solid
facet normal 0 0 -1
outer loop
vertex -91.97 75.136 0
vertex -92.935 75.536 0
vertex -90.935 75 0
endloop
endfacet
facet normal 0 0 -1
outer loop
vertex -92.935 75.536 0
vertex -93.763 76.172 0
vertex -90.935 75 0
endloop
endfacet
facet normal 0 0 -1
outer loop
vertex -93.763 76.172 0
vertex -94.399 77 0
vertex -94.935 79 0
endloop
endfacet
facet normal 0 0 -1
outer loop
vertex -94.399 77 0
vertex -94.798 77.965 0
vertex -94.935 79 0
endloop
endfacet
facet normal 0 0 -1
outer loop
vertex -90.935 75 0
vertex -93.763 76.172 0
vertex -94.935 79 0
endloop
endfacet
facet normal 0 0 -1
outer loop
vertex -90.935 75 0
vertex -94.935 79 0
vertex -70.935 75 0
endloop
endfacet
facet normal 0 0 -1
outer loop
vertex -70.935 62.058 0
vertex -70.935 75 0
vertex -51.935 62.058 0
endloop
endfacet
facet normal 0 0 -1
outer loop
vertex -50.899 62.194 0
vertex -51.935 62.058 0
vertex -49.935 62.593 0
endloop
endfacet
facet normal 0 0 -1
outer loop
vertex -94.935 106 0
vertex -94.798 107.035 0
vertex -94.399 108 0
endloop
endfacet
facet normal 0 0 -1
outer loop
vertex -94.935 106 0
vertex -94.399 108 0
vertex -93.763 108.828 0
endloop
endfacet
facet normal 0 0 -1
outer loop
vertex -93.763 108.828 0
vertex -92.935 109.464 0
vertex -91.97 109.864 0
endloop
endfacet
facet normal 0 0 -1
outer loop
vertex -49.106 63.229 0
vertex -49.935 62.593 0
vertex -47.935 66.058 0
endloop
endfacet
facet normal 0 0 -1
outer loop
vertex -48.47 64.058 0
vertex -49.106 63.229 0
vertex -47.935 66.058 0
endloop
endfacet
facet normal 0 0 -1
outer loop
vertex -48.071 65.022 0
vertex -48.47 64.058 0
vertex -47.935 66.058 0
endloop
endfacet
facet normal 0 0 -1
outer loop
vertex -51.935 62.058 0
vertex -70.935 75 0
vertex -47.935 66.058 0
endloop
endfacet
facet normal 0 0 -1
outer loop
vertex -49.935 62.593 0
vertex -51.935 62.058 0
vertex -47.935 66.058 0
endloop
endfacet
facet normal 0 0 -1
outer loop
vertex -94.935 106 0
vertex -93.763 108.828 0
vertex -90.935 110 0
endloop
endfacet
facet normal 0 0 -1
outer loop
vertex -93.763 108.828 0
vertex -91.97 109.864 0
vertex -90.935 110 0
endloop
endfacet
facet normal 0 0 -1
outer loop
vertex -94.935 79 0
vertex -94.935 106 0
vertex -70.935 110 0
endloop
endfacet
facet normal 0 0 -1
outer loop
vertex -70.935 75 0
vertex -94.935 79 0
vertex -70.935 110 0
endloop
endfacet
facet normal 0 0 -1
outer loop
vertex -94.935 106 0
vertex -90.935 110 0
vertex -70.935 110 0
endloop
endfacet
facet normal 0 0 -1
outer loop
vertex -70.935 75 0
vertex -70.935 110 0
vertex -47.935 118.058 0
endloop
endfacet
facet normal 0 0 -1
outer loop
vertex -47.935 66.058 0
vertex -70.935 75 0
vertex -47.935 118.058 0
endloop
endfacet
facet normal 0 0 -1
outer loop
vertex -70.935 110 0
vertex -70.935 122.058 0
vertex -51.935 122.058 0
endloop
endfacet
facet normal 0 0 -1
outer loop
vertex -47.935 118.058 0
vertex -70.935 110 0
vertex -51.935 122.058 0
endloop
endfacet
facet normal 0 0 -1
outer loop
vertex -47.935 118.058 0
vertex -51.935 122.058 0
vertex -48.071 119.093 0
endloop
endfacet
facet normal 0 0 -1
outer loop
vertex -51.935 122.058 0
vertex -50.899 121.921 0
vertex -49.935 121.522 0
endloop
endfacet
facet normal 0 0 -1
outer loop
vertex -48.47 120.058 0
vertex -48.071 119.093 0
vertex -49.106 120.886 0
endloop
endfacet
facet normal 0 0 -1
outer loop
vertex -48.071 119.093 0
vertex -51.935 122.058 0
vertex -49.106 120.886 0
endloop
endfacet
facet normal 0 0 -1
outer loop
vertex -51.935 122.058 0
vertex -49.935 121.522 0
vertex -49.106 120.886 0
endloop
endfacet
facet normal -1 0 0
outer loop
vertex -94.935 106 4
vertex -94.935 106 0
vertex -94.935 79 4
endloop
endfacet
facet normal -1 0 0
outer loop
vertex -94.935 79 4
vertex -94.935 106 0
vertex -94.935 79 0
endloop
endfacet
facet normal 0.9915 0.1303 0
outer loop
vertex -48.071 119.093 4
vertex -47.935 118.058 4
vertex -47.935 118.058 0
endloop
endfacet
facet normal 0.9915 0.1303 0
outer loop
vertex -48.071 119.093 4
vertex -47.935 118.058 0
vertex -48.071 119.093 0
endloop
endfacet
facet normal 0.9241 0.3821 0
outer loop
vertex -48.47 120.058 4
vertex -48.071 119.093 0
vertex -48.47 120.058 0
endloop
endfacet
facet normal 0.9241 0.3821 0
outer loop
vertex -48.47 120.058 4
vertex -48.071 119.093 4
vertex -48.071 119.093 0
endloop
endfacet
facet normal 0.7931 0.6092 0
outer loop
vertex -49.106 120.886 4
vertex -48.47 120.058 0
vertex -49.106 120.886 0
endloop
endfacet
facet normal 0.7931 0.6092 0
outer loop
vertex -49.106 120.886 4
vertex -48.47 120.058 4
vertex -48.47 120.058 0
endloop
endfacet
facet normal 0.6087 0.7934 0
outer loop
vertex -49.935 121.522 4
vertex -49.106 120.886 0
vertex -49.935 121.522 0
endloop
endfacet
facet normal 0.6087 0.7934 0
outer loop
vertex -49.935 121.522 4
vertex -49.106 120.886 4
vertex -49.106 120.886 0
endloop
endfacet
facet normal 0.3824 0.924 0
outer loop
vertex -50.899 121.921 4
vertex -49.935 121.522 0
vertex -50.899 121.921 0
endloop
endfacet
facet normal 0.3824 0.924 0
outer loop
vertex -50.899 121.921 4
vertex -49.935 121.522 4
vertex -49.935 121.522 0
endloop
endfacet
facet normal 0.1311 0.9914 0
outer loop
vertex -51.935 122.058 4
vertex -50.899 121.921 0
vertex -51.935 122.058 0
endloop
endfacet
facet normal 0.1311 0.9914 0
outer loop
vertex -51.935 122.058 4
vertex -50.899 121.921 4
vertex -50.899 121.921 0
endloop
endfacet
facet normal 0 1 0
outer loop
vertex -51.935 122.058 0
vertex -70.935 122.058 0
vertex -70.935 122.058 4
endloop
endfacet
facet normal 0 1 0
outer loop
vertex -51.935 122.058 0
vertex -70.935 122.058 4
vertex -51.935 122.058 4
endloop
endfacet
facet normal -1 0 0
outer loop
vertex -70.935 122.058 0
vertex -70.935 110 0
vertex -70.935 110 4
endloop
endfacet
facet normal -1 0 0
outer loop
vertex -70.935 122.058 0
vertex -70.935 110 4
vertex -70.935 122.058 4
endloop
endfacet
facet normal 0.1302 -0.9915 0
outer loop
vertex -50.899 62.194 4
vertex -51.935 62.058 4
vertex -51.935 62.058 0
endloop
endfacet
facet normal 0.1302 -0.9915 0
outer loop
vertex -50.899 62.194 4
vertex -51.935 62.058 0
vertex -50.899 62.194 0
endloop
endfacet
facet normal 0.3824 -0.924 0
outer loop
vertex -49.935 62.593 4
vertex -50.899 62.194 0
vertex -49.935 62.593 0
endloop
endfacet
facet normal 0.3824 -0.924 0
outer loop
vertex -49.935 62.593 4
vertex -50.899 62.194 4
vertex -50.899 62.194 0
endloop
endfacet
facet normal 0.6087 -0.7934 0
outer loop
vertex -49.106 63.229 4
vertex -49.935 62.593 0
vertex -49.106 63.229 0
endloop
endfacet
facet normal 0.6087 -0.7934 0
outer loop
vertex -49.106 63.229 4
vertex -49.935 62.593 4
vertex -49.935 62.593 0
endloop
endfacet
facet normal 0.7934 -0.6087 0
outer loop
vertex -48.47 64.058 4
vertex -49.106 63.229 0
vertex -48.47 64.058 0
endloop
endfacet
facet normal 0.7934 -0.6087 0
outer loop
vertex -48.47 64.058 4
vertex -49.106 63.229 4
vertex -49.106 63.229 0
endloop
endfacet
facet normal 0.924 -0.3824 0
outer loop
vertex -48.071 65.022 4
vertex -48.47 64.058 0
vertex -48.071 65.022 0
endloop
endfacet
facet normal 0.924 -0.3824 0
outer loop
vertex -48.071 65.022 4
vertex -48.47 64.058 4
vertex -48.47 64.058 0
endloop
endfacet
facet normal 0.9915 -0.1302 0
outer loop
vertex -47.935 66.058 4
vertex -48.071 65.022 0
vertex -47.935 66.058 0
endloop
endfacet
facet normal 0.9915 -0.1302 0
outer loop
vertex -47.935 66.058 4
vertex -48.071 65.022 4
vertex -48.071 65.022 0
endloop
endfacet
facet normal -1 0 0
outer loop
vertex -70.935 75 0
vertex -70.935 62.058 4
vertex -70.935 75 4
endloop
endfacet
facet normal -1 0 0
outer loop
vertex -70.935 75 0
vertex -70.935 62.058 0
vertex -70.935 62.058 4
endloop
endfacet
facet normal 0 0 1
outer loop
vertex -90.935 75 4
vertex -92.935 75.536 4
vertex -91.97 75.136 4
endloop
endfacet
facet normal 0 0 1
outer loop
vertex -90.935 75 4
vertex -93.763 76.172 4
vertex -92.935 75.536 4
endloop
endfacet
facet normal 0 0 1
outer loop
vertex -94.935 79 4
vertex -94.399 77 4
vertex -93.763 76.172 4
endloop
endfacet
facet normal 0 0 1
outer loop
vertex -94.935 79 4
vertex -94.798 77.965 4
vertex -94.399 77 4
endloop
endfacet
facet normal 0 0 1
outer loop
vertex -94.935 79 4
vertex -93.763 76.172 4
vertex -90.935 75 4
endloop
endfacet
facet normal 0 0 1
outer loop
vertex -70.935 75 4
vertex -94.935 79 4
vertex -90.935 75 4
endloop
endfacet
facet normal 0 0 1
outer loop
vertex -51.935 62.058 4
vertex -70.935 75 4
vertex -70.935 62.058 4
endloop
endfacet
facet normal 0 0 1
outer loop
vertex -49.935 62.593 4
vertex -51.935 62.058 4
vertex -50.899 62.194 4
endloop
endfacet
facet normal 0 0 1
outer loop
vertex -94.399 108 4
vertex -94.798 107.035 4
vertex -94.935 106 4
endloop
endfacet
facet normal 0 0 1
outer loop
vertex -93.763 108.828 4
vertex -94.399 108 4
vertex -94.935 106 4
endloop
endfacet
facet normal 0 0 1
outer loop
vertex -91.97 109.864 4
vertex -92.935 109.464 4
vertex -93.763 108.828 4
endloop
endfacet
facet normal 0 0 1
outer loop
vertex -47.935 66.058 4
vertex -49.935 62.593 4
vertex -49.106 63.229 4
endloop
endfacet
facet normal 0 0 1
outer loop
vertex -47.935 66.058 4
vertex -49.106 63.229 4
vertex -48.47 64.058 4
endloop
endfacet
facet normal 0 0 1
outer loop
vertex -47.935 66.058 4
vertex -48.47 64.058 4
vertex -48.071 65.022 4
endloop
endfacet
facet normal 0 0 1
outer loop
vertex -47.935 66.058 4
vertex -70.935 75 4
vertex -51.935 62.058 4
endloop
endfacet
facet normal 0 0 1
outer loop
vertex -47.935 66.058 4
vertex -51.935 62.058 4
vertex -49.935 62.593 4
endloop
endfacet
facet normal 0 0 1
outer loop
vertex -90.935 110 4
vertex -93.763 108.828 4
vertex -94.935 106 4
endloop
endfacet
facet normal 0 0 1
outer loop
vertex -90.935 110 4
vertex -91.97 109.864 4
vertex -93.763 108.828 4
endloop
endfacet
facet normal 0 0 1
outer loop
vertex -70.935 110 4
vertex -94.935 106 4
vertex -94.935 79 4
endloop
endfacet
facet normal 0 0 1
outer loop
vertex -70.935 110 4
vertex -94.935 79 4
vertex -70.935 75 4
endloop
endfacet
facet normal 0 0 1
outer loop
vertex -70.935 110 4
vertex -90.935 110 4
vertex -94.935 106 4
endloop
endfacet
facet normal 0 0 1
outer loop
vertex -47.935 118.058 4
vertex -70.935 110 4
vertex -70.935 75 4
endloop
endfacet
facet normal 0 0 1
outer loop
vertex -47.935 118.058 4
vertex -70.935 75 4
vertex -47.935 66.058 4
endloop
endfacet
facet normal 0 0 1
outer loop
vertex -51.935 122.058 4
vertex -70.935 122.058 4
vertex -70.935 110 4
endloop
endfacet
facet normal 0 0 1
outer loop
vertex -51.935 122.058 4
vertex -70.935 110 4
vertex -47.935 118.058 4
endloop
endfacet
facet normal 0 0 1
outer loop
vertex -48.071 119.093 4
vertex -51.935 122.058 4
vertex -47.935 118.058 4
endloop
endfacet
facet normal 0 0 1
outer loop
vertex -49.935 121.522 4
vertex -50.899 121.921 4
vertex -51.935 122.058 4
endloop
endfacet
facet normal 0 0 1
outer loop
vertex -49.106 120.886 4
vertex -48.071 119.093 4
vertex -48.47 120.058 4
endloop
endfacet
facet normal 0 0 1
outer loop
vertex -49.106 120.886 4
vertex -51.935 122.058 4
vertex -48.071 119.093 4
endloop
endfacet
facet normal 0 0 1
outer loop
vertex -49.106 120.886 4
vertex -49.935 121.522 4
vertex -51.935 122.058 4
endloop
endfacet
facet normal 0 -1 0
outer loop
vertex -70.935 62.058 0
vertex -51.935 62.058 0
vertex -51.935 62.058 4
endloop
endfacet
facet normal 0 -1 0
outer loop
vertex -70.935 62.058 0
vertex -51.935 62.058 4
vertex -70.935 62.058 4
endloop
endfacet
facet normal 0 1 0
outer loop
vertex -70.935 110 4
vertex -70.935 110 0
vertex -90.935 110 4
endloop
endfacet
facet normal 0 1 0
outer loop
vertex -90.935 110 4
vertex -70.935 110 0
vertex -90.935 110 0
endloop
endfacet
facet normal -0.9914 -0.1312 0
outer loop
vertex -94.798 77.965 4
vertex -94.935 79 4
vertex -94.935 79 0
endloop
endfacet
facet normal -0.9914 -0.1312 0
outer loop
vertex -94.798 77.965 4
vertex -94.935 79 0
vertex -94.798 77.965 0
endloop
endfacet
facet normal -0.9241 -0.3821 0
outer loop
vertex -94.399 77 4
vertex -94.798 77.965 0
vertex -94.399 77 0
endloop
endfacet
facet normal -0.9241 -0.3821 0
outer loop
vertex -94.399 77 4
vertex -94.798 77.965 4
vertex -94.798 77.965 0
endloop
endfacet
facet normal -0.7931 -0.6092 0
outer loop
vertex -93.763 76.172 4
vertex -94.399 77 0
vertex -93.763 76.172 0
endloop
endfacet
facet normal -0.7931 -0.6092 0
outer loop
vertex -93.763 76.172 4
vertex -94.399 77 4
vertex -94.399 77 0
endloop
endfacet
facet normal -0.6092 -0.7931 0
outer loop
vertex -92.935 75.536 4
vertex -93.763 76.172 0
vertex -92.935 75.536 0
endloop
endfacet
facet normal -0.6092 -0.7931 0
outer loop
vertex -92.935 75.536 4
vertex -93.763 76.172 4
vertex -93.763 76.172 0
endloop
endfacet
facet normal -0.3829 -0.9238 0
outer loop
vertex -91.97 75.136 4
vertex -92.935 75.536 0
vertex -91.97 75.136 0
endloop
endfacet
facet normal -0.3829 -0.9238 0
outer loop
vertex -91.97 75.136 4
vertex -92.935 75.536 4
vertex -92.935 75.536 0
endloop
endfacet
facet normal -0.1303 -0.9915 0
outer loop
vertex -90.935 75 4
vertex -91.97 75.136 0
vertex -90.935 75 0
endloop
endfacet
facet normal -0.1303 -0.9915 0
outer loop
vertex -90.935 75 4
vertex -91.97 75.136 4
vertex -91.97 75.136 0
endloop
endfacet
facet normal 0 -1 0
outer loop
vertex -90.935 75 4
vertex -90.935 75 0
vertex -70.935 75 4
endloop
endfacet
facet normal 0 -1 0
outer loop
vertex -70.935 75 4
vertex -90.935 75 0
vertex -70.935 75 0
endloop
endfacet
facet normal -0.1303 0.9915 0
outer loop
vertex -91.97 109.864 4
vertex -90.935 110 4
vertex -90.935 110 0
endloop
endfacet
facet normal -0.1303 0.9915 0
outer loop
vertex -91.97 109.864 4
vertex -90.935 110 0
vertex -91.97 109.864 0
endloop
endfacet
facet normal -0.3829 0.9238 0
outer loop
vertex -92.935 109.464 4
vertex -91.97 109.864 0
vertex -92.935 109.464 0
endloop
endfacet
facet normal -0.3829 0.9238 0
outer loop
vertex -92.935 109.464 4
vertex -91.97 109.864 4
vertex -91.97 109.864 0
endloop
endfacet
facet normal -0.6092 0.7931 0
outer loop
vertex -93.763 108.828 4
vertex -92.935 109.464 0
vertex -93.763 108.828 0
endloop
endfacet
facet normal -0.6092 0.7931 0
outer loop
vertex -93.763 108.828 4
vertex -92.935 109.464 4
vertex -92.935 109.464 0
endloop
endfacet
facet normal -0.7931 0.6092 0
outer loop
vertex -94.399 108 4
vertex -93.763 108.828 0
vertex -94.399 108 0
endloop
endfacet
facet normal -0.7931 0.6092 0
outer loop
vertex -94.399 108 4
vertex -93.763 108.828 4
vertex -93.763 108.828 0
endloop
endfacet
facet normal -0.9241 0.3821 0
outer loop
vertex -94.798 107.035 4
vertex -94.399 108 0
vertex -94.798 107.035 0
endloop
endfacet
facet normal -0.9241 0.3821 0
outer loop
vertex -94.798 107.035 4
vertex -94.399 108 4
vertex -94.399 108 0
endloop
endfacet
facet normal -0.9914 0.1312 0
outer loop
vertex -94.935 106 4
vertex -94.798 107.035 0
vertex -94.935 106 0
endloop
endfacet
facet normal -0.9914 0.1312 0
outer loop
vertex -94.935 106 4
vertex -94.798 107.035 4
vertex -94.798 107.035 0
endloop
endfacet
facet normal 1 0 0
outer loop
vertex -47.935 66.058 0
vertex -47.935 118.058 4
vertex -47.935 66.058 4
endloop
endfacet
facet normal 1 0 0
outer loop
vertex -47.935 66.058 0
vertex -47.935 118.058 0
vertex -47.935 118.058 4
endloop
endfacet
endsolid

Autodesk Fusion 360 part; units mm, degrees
sketch "Sketch1" plane through (0, 0, 0) normal (0, 0, 1) x (1, 0, 0)
  line L0 (-47.9346, 62.0575) -> (-70.9346, 62.0575)
  line L1 (-70.9346, 62.0575) -> (-70.9346, 122.0575)
  line L2 (-70.9346, 122.0575) -> (-47.9346, 122.0575)
  line L3 (-47.9346, 122.0575) -> (-47.9346, 62.0575)
  line L4 (-70.9346, 110) -> (-94.9346, 110)
  line L5 (-94.9346, 110) -> (-94.9346, 75)
  line L6 (-94.9346, 75) -> (-70.9346, 75)
  line L7 (-70.9346, 75) -> (-70.9346, 110)
  dimension "d1" = 35
  dimension "d3" = 60
  dimension "d4" = 24
  dimension "d10" = 23
extrude "Extrude1" add sketch "Sketch1" along normal blind 4
fillet "Fillet1" radius 4 2 edges at (-47.9346, 62.0575, 2) (-47.9346, 122.0575, 2)
fillet "Fillet1" radius 4 2 edges at (-94.9346, 75, 2) (-94.9346, 110, 2)
